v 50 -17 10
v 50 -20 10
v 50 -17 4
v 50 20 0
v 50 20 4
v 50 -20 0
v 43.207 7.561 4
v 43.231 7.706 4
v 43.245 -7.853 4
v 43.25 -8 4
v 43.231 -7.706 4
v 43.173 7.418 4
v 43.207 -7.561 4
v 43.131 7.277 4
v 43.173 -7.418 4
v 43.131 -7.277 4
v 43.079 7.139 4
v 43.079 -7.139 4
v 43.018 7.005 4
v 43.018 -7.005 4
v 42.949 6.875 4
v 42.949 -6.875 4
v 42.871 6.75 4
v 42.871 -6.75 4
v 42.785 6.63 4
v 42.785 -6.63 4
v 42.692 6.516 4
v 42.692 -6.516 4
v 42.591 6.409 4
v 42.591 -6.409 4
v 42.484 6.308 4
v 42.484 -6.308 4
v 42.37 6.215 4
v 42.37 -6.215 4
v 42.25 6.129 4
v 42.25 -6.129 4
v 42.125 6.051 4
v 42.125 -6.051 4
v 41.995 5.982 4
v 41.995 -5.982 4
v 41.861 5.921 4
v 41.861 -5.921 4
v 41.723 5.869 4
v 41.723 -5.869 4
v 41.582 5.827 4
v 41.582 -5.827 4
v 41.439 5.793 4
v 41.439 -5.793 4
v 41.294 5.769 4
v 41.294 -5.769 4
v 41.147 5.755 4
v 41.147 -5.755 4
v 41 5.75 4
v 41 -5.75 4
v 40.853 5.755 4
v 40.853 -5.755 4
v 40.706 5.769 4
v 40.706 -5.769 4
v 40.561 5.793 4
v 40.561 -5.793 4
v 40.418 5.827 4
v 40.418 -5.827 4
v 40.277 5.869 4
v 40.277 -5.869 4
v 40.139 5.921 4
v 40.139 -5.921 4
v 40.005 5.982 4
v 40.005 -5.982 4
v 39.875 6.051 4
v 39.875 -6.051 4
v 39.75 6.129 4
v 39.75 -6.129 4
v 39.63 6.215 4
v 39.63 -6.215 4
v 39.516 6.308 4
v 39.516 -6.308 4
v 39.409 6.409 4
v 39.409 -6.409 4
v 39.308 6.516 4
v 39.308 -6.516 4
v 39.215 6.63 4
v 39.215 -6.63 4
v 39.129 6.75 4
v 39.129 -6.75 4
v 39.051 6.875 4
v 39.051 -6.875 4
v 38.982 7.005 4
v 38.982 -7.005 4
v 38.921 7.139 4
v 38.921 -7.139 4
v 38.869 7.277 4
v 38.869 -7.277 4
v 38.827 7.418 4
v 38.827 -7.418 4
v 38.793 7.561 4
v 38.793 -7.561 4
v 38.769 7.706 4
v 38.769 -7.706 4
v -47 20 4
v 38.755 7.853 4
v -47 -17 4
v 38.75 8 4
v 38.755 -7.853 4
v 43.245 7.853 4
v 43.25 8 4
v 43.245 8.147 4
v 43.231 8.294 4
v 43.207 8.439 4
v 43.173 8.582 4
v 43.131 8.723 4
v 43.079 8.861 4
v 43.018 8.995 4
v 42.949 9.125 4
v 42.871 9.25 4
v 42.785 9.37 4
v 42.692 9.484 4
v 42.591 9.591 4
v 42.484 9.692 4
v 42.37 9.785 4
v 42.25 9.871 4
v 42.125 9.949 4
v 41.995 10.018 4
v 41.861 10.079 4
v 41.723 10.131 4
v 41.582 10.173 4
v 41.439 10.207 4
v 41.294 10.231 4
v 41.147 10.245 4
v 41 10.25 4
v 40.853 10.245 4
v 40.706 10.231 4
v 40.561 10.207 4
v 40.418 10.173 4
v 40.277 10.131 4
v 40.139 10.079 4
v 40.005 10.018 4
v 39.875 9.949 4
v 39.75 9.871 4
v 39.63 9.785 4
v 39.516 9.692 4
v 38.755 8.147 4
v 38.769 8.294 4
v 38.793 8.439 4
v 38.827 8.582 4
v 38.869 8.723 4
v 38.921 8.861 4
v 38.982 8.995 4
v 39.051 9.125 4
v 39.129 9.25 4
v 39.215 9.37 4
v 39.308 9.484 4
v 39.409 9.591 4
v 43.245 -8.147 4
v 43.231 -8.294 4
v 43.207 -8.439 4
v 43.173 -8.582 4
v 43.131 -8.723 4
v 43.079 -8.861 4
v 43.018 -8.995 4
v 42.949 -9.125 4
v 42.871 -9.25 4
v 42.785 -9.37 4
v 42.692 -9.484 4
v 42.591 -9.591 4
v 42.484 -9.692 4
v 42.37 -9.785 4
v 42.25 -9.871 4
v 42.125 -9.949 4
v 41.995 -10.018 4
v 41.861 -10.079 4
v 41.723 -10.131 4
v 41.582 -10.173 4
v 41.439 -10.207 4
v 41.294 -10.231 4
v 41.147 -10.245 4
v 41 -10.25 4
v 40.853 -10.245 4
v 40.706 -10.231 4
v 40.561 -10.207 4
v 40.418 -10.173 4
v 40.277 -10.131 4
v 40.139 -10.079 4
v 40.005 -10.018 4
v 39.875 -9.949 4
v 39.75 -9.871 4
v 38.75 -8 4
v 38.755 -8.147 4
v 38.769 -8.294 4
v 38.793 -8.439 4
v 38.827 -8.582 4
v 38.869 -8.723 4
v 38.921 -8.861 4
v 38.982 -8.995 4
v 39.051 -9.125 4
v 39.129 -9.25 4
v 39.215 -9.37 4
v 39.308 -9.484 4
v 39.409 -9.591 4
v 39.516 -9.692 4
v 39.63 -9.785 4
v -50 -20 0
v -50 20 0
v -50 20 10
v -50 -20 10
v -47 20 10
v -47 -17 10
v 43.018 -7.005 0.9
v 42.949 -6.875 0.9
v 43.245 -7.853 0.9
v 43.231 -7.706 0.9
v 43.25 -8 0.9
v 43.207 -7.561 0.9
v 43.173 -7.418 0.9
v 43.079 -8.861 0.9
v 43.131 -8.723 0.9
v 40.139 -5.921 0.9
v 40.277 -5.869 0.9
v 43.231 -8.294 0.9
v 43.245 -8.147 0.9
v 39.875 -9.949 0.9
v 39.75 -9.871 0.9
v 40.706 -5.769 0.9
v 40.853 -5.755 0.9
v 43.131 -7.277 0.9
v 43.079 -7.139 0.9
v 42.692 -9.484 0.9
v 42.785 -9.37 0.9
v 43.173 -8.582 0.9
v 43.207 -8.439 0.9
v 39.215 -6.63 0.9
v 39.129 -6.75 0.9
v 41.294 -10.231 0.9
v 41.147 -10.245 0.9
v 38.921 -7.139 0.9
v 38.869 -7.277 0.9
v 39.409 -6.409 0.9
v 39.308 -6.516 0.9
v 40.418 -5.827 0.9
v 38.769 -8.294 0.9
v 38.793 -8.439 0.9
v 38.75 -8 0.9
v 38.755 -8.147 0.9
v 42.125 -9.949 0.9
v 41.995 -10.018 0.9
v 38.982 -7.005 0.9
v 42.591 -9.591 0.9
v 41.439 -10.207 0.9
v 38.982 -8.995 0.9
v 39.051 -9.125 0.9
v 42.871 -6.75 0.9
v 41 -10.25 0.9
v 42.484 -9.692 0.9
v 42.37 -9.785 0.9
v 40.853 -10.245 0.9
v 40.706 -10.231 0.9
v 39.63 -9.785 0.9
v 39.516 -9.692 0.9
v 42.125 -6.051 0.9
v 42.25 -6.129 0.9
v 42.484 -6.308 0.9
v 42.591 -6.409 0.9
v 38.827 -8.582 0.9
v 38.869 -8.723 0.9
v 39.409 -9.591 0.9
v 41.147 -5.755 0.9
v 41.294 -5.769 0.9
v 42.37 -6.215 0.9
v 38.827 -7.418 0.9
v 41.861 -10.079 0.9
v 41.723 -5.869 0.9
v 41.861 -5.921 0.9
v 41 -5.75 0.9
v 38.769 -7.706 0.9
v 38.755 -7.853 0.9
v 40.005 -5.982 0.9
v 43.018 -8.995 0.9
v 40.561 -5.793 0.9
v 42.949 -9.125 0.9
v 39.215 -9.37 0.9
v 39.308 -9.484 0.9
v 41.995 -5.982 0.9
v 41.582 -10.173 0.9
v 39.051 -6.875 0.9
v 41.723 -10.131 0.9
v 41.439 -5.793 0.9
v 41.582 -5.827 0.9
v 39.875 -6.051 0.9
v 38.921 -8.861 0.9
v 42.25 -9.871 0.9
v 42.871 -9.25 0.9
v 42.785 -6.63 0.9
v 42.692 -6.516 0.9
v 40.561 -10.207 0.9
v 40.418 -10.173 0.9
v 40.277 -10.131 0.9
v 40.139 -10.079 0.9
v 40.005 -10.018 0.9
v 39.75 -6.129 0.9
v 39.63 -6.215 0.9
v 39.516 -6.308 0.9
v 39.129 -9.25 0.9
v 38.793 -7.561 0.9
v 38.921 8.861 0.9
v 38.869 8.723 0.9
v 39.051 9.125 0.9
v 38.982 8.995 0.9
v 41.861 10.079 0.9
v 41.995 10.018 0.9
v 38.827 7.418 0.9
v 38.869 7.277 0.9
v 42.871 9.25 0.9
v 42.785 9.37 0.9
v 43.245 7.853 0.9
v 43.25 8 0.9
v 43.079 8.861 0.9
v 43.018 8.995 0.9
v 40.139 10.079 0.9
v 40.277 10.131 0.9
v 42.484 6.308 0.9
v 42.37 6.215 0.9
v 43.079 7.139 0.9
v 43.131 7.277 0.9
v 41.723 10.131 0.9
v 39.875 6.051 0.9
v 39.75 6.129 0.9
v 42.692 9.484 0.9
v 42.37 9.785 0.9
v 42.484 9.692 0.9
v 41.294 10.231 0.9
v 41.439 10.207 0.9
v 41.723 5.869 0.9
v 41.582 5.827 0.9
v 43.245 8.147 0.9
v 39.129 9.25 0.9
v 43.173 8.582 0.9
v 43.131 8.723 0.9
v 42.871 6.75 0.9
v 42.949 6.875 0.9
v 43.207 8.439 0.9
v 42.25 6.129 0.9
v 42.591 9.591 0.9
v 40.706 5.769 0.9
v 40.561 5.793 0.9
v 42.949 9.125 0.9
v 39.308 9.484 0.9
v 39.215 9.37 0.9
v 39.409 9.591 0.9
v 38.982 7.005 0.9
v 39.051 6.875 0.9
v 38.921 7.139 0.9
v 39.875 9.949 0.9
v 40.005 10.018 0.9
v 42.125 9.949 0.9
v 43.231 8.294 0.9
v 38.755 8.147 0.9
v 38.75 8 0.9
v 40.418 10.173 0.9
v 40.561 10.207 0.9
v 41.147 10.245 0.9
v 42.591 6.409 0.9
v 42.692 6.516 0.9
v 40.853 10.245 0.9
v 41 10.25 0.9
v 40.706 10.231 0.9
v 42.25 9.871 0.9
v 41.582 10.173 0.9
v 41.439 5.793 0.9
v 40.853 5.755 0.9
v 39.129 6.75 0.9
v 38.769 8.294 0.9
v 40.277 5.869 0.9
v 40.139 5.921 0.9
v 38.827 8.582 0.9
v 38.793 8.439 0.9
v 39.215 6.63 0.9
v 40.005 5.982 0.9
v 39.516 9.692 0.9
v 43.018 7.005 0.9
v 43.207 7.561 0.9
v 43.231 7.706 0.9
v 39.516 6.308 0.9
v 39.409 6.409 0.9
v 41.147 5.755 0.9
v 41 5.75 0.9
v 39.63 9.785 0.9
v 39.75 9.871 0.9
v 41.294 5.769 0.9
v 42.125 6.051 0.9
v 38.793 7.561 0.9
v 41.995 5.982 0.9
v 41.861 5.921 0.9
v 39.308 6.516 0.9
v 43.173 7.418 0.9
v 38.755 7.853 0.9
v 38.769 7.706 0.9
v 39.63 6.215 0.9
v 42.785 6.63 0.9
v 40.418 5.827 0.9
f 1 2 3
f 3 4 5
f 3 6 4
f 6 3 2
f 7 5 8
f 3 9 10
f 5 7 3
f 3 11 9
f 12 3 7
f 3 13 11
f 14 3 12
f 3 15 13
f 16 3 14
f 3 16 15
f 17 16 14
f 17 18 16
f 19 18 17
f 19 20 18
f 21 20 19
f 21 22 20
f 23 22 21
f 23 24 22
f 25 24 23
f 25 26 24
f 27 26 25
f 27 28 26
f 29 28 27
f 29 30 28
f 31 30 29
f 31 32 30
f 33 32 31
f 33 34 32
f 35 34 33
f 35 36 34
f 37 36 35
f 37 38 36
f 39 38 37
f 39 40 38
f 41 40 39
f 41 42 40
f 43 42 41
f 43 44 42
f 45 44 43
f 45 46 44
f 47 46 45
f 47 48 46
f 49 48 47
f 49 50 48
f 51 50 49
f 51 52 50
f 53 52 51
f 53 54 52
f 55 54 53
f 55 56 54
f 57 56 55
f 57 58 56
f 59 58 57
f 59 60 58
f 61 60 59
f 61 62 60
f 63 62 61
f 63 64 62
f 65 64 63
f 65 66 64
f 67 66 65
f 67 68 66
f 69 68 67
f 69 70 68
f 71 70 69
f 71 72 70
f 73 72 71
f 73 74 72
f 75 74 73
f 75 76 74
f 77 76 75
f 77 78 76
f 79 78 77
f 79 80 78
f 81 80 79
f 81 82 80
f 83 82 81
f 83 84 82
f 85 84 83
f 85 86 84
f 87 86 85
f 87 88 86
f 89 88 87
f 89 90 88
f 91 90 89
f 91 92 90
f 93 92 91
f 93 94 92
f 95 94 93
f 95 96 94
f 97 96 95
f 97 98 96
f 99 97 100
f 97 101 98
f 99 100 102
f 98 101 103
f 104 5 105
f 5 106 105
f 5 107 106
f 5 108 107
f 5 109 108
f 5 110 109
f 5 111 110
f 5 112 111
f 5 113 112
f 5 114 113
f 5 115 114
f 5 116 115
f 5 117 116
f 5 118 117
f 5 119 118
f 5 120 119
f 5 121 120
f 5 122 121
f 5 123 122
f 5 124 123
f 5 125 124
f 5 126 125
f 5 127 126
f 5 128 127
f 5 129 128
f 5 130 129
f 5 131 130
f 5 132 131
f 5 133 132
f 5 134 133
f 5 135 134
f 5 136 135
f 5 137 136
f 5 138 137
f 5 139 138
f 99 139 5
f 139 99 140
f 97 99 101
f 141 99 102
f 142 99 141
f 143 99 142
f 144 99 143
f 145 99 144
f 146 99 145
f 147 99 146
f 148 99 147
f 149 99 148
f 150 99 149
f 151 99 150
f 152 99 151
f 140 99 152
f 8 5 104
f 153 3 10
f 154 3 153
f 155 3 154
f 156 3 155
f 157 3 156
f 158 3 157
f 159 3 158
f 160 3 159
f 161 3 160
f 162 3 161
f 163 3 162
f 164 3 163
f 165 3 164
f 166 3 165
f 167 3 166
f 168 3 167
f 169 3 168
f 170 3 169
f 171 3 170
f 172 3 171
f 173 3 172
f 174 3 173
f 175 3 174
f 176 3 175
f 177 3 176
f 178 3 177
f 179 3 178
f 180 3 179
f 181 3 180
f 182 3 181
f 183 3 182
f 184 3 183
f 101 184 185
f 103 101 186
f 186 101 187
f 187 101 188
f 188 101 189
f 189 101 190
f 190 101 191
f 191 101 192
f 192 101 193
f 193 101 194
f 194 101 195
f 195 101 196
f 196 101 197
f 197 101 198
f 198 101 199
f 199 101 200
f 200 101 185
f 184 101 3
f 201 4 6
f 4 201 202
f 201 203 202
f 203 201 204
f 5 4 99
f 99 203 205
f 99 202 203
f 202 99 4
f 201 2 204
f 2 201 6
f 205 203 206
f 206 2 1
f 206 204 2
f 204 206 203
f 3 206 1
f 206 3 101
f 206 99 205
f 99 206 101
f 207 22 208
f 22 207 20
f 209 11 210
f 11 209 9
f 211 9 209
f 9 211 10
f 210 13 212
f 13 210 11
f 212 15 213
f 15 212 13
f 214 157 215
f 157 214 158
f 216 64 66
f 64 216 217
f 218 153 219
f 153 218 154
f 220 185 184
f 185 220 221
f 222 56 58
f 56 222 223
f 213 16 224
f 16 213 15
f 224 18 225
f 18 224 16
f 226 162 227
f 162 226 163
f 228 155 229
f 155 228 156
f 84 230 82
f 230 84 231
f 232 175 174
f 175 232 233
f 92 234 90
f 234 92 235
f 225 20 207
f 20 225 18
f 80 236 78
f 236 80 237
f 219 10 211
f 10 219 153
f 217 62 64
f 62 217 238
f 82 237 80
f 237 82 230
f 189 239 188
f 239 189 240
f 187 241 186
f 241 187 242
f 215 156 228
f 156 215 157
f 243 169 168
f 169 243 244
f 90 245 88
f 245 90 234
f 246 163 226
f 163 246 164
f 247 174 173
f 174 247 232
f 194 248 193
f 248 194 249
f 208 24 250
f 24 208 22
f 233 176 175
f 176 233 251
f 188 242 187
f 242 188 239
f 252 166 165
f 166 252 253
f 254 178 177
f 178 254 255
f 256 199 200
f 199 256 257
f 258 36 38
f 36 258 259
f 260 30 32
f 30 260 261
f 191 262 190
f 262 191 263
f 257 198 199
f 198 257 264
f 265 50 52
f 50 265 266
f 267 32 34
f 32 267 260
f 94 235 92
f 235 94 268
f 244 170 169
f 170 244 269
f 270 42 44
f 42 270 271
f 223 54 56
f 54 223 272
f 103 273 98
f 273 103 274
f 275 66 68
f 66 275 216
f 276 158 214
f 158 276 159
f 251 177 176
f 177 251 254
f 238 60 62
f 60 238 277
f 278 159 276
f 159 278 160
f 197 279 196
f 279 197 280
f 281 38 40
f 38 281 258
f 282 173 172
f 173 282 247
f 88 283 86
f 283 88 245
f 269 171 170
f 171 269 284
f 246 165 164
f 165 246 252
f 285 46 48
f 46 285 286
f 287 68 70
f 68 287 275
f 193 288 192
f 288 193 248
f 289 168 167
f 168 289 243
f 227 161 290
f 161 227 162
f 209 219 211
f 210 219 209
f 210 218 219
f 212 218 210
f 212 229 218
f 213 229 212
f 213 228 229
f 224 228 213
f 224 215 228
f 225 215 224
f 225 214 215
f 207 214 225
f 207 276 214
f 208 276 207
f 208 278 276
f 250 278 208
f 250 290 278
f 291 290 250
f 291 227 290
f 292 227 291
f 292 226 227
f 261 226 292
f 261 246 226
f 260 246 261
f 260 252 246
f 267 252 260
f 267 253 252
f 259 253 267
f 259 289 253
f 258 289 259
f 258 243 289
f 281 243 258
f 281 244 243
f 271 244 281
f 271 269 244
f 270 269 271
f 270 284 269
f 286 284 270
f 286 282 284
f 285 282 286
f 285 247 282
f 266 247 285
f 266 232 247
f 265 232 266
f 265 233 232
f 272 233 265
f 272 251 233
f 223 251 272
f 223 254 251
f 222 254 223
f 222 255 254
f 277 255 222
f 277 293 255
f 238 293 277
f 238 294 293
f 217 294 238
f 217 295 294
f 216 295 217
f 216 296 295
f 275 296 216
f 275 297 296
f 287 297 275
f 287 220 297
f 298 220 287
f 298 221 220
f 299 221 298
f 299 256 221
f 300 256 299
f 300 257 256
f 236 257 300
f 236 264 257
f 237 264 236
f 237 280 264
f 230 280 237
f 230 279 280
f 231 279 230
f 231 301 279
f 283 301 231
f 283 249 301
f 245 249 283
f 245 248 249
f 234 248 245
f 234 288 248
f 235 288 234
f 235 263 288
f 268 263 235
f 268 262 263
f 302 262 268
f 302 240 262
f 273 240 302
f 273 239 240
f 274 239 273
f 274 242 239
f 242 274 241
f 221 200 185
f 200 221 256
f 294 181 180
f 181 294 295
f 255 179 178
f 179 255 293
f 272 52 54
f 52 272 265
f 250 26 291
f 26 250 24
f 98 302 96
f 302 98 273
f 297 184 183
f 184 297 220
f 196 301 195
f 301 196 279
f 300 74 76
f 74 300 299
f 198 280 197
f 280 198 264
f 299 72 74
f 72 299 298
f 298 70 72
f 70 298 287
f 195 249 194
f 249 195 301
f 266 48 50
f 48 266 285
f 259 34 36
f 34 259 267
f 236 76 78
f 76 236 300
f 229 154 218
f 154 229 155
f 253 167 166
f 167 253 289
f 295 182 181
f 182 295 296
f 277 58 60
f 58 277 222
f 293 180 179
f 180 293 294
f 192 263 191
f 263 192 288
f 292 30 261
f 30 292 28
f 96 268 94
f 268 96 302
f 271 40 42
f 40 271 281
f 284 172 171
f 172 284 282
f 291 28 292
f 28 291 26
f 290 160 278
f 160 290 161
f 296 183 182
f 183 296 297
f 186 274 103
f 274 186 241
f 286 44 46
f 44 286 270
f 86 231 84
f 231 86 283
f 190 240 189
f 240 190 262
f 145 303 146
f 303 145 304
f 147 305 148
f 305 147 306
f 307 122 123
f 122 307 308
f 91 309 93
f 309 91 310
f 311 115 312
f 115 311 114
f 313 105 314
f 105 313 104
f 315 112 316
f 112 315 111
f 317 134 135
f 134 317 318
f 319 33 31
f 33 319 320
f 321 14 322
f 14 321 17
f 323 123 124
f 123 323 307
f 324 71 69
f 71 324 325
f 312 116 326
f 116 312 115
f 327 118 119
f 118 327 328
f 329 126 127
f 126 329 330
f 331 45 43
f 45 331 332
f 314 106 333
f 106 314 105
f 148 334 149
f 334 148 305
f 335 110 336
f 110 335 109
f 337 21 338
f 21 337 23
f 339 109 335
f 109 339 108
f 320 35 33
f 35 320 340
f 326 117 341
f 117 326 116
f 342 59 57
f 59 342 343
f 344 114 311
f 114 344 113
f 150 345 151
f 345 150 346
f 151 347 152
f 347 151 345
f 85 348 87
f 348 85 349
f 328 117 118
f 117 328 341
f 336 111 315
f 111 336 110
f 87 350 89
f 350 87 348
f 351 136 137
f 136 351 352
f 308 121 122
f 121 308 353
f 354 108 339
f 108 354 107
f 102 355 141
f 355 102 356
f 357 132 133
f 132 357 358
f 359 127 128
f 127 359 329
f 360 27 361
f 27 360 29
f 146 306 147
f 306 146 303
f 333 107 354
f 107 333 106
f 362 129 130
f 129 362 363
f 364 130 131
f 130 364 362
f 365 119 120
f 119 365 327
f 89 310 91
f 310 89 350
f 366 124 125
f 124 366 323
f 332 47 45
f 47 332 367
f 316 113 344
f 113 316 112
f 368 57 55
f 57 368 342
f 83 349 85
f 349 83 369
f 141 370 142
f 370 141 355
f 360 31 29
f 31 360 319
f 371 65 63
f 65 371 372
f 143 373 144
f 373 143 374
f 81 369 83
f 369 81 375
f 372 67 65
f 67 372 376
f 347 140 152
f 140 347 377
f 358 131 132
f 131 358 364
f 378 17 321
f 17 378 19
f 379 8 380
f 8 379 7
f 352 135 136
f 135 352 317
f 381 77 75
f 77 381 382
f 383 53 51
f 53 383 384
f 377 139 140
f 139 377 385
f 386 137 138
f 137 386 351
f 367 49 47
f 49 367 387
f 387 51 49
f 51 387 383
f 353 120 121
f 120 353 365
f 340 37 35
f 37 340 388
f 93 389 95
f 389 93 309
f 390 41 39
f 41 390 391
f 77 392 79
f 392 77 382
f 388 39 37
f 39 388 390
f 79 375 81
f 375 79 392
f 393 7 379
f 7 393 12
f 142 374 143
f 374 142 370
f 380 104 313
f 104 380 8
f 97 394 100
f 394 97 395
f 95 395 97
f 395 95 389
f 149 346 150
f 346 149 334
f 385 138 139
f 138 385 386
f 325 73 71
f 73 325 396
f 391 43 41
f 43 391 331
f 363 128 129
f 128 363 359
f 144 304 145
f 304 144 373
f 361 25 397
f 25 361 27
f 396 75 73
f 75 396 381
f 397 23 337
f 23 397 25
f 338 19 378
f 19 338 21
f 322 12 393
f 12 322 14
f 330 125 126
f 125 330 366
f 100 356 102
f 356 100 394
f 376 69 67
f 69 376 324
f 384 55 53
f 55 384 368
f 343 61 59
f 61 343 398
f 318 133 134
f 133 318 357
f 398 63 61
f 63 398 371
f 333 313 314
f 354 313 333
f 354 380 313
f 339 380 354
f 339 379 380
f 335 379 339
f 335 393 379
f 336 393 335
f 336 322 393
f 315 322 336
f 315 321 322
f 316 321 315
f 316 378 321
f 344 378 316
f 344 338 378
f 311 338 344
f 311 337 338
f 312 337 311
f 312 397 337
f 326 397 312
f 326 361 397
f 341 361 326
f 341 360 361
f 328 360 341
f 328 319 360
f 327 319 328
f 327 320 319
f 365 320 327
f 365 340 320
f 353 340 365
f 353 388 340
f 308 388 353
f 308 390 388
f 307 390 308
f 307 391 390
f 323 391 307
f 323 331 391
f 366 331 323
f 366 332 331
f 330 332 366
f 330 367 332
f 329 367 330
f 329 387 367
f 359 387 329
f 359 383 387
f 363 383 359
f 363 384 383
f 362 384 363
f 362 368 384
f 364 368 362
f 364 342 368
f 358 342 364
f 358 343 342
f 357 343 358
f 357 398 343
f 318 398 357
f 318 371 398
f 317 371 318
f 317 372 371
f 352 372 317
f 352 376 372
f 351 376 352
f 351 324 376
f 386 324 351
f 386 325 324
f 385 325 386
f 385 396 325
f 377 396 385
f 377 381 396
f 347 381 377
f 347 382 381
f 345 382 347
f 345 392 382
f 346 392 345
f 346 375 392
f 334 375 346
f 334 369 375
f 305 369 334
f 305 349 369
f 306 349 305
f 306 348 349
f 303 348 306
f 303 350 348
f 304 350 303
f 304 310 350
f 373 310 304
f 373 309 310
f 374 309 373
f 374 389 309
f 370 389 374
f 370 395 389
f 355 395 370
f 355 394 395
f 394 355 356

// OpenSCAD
// Microscope-slide registration jig with two clamp holes
// Category: benchware; Purpose: repeatable origin when photographing a 75 x 25 mm microscope slide.
// Print: FDM, on the broad bottom face at z=0; no support required.
// This is a geometric reference design; no dimensional fit or lab use has been physically validated.
// SPDX-License-Identifier: CERN-OHL-P-2.0

/* [Platform] */
// Overall platform length, X (mm)
base_l = 100; // 0.5
// Overall platform width, Y (mm)
base_w = 40; // 0.5
// Platform thickness (mm)
base_h = 4; // 0.5

/* [Registration Edges] */
// Width of each perpendicular registration rail (mm)
rail_w = 3; // 0.1
// Height of rails above print bed (mm)
rail_top = 10; // 0.5

/* [Fasteners] */
// Diameter of each right-side mounting hole (mm)
bore_d = 4.5; // 0.1
// X coordinate of the mounting-hole centers (mm)
bore_x = 41; // 0.5
// Absolute Y coordinate of mounting-hole centers (mm)
bore_y = 8; // 0.5

/* [Hidden] */
$fn = 96;
eps = 0.1;
assert(base_l >= 90 && base_w >= 35);
assert(rail_w >= 1.6 && rail_top >= base_h + 2);
assert(bore_d > 0 && bore_d < 8);
assert(bore_x + bore_d/2 < base_l/2 - 1);
assert(bore_x - bore_d/2 > -base_l/2 + rail_w + 1);
assert(bore_y + bore_d/2 < base_w/2 - 1);
assert(bore_y - bore_d/2 > -base_w/2 + rail_w + 1);
assert(bore_d / 2 + 2 < bore_y);

difference() {
    union() {
        translate([-base_l/2, -base_w/2, 0])
            cube([base_l, base_w, base_h]);
        translate([-base_l/2, -base_w/2, base_h])
            cube([base_l, rail_w, rail_top-base_h]);
        translate([-base_l/2, -base_w/2, base_h])
            cube([rail_w, base_w, rail_top-base_h]);
    }
    for (sign=[-1,1])
        translate([bore_x, sign*bore_y, 0.9])
            cylinder(h=base_h+2*eps, d=bore_d);
}
